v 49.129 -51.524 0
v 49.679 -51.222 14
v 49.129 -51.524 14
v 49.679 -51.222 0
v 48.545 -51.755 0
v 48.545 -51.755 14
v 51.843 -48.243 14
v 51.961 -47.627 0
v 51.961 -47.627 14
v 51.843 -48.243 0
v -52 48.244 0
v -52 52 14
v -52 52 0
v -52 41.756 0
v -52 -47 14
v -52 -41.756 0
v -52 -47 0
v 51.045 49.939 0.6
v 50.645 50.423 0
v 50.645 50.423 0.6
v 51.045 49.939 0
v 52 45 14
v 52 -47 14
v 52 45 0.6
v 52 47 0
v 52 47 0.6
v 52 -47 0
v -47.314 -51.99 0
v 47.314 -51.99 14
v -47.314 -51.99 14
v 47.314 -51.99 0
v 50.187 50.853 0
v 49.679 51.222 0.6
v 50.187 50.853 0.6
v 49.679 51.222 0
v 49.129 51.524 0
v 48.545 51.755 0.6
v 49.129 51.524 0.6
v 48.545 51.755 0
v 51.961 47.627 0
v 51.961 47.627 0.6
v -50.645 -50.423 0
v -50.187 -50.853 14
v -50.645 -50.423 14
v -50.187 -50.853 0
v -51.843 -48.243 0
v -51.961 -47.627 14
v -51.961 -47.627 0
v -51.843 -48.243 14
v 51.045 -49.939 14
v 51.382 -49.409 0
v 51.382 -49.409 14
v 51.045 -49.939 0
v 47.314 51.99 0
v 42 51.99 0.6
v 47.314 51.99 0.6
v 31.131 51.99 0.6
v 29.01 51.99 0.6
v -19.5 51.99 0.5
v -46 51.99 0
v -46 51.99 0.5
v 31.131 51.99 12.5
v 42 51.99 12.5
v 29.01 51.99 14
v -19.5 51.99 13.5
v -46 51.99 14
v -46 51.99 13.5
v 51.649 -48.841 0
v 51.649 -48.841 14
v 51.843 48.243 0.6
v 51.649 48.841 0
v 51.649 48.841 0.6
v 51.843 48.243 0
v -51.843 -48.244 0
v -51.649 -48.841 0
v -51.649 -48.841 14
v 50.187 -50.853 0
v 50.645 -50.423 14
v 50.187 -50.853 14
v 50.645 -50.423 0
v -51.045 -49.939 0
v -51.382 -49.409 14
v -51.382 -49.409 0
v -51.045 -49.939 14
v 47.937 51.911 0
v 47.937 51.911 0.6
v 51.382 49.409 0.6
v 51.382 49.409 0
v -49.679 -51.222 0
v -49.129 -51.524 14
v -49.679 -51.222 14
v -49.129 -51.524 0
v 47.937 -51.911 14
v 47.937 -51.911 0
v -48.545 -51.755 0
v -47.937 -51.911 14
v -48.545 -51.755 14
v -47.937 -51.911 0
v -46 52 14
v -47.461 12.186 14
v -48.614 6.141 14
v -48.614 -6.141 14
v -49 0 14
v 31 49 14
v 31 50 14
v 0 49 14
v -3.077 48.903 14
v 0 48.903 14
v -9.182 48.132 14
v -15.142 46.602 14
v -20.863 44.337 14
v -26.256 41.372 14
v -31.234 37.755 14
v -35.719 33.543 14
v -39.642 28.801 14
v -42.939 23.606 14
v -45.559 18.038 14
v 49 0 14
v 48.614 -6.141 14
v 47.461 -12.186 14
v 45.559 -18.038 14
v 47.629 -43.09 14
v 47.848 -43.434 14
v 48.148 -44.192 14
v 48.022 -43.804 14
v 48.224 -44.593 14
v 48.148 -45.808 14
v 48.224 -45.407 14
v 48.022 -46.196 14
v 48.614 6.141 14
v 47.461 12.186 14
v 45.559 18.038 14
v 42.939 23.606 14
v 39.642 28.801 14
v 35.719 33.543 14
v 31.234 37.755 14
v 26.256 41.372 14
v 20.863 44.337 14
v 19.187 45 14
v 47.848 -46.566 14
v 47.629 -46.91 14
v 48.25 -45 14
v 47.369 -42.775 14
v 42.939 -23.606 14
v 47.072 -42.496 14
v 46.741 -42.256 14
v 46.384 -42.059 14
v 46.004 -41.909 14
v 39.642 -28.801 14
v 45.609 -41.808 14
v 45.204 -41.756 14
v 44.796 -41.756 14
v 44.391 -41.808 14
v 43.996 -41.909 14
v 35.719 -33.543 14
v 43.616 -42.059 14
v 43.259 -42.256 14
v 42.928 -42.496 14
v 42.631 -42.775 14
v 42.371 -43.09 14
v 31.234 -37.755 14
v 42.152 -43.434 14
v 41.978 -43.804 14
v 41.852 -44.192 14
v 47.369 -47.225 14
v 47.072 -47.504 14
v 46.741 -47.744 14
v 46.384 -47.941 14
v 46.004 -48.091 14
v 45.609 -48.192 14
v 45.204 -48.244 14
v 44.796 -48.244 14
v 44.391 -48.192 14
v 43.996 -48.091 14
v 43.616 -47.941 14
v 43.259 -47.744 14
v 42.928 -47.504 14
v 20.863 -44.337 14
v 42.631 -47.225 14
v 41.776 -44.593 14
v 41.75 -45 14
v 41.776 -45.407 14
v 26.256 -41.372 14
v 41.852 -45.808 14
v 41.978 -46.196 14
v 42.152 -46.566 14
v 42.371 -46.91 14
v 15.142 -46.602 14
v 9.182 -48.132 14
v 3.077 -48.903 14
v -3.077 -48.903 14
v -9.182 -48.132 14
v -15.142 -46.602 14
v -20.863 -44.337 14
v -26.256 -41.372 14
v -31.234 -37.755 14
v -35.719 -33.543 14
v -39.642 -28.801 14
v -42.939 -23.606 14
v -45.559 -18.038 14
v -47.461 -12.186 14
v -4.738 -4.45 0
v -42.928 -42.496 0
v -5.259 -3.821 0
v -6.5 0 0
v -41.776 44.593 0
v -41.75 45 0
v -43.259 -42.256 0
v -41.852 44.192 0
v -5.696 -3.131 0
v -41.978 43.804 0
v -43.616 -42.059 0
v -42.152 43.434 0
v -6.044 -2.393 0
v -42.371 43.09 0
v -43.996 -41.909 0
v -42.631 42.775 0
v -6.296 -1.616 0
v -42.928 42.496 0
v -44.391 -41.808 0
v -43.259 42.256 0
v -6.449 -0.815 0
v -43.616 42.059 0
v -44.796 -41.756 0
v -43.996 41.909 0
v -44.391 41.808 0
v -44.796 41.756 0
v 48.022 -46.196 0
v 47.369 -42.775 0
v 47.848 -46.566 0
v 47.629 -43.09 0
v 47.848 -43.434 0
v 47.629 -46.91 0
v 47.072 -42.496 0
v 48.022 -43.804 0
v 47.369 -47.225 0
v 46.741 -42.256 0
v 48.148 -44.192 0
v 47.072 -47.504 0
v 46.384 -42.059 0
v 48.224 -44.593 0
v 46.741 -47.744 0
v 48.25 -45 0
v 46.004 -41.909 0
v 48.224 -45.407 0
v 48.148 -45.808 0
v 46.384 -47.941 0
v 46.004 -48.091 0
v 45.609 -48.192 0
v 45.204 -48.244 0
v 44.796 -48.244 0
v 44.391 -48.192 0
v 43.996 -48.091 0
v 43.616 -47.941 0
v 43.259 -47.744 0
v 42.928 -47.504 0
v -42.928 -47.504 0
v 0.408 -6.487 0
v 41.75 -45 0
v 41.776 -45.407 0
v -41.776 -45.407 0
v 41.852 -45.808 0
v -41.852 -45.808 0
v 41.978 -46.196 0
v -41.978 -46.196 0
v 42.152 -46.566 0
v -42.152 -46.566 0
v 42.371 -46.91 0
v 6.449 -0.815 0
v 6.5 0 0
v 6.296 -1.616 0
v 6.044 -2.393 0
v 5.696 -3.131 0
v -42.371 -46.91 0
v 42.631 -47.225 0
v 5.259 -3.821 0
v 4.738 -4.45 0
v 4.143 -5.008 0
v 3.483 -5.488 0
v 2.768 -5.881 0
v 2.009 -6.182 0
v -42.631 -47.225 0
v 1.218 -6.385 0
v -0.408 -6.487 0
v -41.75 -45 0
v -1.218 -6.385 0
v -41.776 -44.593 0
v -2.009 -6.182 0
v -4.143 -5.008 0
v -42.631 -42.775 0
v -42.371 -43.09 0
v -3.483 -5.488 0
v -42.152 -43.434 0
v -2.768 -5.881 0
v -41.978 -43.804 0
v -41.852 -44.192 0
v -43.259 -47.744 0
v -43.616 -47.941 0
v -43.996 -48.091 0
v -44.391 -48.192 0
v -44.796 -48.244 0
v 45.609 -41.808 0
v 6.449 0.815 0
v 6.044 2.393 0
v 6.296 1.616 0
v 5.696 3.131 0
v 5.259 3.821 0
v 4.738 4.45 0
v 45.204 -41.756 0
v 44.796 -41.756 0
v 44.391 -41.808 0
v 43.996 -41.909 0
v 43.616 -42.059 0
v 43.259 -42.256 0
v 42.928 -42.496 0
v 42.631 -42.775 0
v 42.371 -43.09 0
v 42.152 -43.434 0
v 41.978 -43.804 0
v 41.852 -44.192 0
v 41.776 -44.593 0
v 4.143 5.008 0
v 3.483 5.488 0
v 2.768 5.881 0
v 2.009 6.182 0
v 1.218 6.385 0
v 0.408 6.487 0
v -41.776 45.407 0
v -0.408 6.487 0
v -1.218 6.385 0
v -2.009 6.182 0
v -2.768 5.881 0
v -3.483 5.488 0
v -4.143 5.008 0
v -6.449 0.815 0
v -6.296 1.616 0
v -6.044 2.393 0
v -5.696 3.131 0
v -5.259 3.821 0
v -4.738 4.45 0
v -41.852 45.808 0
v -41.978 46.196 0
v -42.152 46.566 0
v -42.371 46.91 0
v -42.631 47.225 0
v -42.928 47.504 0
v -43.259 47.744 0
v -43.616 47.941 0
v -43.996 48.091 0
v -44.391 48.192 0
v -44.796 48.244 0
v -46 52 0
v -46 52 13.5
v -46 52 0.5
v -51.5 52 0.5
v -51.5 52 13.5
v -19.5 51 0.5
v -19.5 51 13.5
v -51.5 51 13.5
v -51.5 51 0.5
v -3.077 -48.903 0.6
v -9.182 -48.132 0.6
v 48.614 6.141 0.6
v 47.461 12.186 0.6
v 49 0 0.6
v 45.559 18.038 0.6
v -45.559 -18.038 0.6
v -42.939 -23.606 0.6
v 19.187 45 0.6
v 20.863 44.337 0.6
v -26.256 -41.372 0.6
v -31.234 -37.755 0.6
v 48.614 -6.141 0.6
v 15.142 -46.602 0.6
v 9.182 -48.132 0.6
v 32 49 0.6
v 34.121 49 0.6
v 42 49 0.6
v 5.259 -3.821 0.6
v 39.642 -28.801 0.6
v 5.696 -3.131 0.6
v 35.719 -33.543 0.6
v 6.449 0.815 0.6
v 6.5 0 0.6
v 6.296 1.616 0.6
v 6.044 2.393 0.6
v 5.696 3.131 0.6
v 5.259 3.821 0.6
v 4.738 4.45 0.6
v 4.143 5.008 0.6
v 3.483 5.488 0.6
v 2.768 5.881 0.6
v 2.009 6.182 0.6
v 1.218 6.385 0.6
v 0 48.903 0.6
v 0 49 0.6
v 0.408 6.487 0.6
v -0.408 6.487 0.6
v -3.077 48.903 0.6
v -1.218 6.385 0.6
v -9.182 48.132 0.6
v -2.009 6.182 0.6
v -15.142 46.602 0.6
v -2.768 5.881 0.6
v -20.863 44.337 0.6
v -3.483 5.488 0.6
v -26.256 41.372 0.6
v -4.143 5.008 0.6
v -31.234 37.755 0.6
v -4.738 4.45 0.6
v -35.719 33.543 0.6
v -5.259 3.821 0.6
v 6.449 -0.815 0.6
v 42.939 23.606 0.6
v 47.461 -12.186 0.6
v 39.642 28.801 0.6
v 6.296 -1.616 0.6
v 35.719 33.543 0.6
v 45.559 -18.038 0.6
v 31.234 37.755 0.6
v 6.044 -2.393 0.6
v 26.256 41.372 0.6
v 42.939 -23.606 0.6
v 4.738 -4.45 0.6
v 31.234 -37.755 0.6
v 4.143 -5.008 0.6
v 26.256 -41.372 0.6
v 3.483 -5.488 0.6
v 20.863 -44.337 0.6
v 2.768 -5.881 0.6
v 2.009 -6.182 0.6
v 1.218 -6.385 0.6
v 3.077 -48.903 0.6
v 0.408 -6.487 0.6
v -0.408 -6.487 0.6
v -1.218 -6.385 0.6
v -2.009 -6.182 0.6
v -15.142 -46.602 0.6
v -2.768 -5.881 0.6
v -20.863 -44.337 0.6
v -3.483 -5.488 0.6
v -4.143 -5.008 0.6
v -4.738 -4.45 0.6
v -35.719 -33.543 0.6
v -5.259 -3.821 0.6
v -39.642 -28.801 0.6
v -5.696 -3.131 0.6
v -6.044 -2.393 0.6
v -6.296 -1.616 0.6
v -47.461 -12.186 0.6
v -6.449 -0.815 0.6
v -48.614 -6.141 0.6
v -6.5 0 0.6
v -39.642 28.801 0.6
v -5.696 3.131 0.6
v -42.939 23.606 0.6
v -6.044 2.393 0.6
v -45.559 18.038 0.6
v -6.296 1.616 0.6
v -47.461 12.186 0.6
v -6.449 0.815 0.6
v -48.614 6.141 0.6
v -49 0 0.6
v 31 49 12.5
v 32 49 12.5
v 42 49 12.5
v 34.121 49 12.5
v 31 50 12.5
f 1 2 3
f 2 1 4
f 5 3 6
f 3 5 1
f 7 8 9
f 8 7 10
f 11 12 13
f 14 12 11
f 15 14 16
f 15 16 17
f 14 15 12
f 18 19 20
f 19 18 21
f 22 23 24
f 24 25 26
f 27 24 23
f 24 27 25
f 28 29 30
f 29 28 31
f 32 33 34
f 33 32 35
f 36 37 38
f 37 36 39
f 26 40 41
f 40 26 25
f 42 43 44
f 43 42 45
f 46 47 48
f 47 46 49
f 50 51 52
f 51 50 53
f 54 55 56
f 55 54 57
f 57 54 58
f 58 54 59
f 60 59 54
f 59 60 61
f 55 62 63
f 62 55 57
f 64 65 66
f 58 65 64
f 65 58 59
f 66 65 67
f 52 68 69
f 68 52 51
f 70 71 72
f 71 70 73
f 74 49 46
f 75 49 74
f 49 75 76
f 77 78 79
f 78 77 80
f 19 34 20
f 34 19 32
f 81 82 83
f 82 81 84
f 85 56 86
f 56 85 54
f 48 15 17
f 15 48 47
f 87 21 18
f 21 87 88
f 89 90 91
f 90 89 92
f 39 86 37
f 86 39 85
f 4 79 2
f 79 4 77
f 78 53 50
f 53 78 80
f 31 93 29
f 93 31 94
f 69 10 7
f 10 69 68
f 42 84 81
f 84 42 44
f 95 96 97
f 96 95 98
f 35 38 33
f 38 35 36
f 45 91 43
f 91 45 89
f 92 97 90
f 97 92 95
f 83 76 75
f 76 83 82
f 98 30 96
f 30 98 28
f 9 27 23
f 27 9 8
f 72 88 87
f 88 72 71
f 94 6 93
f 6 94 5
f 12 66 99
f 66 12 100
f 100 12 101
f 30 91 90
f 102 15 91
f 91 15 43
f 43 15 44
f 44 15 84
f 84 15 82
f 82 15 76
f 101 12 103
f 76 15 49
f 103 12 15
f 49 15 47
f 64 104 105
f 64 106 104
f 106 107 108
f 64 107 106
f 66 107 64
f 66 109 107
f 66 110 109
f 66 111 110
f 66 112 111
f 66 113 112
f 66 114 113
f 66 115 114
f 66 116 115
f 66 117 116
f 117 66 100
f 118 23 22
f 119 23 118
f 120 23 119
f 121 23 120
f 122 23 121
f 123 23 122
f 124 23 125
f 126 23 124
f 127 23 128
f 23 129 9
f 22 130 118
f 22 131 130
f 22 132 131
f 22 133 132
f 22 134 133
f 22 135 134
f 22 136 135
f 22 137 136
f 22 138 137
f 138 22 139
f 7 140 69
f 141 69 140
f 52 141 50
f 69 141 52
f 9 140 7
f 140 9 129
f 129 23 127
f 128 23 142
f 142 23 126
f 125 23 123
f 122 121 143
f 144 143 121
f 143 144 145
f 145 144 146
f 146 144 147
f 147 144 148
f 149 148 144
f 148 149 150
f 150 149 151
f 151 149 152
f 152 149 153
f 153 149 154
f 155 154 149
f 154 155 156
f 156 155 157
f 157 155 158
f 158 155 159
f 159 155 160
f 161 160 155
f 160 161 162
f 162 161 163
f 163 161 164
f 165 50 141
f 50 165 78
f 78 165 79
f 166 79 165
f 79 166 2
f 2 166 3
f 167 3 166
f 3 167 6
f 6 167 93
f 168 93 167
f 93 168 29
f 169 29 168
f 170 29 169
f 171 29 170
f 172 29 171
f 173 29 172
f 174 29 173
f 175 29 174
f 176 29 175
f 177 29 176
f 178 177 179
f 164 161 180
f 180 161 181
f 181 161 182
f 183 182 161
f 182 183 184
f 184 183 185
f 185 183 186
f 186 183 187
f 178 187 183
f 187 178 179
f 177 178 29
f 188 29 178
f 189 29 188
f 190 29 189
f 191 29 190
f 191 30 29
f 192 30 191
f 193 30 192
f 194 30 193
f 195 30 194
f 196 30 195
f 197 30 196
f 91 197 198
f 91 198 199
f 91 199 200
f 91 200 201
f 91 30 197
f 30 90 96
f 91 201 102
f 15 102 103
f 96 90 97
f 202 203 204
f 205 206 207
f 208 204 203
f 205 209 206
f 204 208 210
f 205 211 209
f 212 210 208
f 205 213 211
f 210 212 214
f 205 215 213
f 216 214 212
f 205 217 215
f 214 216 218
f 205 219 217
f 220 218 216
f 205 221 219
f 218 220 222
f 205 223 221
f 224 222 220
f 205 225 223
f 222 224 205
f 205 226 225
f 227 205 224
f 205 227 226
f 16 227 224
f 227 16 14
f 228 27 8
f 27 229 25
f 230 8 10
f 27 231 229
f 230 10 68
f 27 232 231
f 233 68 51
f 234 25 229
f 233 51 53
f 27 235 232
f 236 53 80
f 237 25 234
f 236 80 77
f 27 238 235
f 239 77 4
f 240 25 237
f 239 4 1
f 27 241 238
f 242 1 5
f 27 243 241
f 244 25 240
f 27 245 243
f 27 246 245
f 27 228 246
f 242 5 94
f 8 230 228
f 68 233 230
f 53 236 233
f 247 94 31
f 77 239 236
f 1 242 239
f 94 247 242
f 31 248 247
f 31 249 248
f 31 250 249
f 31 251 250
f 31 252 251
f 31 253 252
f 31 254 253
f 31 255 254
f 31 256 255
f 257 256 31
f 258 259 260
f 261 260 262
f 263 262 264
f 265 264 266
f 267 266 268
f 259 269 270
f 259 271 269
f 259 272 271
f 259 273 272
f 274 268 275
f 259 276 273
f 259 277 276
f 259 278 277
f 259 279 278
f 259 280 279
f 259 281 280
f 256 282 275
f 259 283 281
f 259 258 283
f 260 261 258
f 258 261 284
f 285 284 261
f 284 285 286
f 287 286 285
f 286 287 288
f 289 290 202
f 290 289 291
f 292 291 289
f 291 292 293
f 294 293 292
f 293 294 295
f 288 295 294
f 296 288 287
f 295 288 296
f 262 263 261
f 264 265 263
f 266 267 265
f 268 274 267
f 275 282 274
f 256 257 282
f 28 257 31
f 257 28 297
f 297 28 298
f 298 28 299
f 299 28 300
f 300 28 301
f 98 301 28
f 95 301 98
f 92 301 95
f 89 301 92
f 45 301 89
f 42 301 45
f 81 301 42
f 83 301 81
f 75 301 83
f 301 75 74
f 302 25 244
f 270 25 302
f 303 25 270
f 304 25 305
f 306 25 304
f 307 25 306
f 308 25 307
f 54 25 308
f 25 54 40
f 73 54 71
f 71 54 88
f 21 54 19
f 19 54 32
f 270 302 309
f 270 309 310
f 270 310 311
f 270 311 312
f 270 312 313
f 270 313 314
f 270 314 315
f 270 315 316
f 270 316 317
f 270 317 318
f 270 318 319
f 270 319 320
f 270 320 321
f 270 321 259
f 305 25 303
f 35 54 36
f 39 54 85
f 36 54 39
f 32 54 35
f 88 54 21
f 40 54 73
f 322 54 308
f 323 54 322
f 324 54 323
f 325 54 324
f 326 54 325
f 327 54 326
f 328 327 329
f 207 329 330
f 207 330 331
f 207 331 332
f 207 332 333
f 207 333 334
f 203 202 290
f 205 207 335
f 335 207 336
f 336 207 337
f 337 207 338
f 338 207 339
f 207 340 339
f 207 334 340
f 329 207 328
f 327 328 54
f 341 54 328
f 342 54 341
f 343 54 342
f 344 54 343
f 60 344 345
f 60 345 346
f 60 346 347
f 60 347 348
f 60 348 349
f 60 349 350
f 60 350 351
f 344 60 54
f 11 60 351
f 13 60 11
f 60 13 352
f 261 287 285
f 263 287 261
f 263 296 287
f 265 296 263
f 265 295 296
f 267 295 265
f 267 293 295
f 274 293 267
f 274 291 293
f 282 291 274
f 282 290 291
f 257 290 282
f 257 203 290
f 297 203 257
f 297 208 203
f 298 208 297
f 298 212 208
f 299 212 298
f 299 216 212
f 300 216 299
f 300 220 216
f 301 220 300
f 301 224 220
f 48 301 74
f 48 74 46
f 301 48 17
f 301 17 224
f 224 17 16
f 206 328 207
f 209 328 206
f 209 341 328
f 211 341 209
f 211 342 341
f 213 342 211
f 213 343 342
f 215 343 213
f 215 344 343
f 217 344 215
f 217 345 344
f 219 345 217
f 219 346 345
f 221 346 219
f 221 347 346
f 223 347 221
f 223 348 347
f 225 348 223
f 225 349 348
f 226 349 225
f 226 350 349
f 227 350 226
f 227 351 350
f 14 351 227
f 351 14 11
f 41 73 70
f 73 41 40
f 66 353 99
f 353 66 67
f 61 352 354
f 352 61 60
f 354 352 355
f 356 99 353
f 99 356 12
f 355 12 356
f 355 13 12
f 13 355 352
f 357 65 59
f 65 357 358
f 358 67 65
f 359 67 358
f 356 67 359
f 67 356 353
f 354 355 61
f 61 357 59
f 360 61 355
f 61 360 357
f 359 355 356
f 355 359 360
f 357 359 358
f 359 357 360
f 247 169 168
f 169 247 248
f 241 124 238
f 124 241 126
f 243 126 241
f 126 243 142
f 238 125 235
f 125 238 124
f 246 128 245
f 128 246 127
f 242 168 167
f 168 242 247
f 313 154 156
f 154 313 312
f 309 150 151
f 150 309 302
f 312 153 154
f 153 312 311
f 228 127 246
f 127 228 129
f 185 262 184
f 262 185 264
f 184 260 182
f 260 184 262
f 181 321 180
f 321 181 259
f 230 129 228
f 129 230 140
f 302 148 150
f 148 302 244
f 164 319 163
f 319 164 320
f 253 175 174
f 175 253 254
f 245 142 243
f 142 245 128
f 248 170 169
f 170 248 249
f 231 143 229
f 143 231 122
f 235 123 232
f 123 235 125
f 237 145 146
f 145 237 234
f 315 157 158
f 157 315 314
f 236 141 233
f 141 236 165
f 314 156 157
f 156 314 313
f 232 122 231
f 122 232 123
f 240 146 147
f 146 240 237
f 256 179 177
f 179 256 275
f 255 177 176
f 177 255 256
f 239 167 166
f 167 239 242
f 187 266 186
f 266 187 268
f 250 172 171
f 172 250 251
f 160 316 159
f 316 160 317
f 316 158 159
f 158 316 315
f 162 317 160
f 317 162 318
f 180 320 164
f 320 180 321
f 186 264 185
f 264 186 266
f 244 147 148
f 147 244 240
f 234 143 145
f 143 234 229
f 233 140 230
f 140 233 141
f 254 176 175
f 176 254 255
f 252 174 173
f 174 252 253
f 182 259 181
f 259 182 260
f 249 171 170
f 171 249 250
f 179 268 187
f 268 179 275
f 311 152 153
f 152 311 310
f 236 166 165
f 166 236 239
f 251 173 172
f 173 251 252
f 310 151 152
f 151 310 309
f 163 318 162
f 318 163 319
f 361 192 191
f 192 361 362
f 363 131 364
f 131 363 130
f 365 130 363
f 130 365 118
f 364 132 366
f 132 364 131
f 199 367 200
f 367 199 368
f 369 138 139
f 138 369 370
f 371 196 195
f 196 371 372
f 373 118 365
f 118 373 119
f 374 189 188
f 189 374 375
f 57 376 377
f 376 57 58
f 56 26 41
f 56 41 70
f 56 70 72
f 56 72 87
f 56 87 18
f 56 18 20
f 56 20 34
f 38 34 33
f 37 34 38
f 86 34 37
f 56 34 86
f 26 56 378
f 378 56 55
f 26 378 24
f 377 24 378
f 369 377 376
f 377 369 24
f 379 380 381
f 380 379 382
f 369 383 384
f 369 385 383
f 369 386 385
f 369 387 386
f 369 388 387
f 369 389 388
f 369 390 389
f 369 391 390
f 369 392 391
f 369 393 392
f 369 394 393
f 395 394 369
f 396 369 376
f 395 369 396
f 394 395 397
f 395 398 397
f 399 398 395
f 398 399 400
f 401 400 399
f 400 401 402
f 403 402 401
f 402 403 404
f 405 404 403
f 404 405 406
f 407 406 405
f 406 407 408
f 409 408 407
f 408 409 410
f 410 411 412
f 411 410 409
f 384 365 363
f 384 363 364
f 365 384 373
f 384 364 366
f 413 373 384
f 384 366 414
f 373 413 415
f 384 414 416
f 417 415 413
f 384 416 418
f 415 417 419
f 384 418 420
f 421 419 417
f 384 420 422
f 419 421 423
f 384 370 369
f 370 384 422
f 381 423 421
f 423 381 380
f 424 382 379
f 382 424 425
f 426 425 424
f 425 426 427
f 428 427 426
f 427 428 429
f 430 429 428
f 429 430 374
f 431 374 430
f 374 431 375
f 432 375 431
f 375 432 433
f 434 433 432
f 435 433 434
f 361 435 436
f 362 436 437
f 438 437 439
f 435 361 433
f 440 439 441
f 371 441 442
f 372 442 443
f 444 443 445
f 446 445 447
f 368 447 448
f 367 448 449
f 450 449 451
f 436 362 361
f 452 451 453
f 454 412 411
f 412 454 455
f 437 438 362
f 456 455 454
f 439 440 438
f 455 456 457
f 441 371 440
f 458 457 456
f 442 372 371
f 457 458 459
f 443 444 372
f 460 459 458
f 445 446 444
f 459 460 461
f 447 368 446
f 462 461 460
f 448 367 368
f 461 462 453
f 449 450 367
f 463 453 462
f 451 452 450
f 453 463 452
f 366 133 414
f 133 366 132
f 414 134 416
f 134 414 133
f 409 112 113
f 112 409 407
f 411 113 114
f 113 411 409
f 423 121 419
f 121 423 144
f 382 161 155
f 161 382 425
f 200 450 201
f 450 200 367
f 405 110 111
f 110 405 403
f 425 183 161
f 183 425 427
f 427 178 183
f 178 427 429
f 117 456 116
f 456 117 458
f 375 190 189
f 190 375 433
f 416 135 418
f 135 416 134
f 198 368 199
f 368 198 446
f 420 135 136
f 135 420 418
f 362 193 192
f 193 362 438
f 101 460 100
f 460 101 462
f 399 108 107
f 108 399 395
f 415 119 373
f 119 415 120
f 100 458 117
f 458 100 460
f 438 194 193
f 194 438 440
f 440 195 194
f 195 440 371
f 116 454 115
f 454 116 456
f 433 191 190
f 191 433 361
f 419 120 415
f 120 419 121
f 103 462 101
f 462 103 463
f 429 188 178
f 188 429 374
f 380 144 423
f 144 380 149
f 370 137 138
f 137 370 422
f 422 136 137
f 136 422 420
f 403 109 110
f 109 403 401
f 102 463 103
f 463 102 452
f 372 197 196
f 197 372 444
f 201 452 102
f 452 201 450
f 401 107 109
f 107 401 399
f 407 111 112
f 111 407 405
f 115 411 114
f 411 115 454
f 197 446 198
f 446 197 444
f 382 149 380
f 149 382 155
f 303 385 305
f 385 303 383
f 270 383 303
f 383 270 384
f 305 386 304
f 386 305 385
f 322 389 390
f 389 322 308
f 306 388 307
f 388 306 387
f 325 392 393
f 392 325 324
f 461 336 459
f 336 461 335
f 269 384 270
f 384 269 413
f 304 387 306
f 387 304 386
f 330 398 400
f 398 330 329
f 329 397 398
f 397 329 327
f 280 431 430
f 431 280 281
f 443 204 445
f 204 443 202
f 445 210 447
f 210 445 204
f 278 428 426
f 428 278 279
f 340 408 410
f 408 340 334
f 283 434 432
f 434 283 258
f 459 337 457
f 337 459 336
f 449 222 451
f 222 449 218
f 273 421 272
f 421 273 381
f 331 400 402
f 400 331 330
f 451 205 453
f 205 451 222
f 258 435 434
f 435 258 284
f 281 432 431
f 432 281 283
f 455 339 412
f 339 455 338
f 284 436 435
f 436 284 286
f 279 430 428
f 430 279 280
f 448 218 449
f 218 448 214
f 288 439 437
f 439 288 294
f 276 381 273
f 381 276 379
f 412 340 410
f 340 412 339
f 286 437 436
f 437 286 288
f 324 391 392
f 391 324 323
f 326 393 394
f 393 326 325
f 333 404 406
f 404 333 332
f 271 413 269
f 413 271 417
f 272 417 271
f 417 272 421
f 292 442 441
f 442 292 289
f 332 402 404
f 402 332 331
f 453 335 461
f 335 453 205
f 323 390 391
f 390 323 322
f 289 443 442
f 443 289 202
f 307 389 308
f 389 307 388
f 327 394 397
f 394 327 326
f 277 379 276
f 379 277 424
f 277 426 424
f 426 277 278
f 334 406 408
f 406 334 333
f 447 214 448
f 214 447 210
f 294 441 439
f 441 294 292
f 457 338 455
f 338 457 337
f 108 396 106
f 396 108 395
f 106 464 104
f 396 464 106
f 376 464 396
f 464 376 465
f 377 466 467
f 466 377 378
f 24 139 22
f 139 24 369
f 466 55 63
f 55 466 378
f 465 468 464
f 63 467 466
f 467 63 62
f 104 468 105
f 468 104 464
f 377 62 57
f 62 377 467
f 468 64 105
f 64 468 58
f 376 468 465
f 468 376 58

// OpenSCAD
$fn = 50;


difference() {
	union() {
		hull() {
			translate(v = [-47.0000000000, 47.0000000000, 0]) {
				cylinder(h = 14, r = 5);
			}
			translate(v = [47.0000000000, 47.0000000000, 0]) {
				cylinder(h = 14, r = 5);
			}
			translate(v = [-47.0000000000, -47.0000000000, 0]) {
				cylinder(h = 14, r = 5);
			}
			translate(v = [47.0000000000, -47.0000000000, 0]) {
				cylinder(h = 14, r = 5);
			}
		}
		translate(v = [-52.0000000000, 46.0000000000, 0]) {
			cube(size = [6, 6, 14]);
		}
	}
	union() {
		translate(v = [-52.5000000000, -45.0000000000, -250.0000000000]) {
			rotate(a = [0, 0, 0]) {
				difference() {
					union() {
						hull() {
							translate(v = [7.5000000000, 0, 0]) {
								cylinder(h = 250, r = 3.2500000000, r1 = 3.2500000000, r2 = 3.2500000000);
							}
							translate(v = [-7.5000000000, 0, 0]) {
								cylinder(h = 250, r = 3.2500000000, r1 = 3.2500000000, r2 = 3.2500000000);
							}
						}
					}
					union();
				}
			}
		}
		translate(v = [-52.5000000000, 45.0000000000, -250.0000000000]) {
			rotate(a = [0, 0, 0]) {
				difference() {
					union() {
						hull() {
							translate(v = [7.5000000000, 0, 0]) {
								cylinder(h = 250, r = 3.2500000000, r1 = 3.2500000000, r2 = 3.2500000000);
							}
							translate(v = [-7.5000000000, 0, 0]) {
								cylinder(h = 250, r = 3.2500000000, r1 = 3.2500000000, r2 = 3.2500000000);
							}
						}
					}
					union();
				}
			}
		}
		translate(v = [-51.5000000000, 51.0000000000, 0.5000000000]) {
			cube(size = [32, 1, 13.0000000000]);
		}
		translate(v = [45.0000000000, -45.0000000000, -50.0000000000]) {
			cylinder(h = 100, r = 3.2500000000);
		}
		translate(v = [0, 0, 0.6000000000]) {
			cylinder(h = 16.4000000000, r = 49.0000000000);
		}
		translate(v = [0, 0, -7.0000000000]) {
			cylinder(h = 14, r = 6.5000000000);
		}
		translate(v = [0.0000000000, 45.0000000000, 0.6000000000]) {
			cube(size = [52.0000000000, 4, 16.4000000000]);
		}
		translate(v = [42.0000000000, 45.0000000000, 0.6000000000]) {
			cube(size = [10, 7, 16.4000000000]);
		}
		translate(v = [31.0000000000, 45.0000000000, 12.5000000000]) {
			cube(size = [21, 7, 1.5000000000]);
		}
		translate(v = [28.2500000000, 52.7500000000, 0.6000000000]) {
			rotate(a = [0, 0, -45]) {
				cube(size = [7.5000000000, 1.5000000000, 16.4000000000]);
			}
		}
		translate(v = [11.0610000000, 43.0000000000, 0.6000000000]) {
			cube(size = [7.5000000000, 2, 13.4000000000]);
		}
	}
}
